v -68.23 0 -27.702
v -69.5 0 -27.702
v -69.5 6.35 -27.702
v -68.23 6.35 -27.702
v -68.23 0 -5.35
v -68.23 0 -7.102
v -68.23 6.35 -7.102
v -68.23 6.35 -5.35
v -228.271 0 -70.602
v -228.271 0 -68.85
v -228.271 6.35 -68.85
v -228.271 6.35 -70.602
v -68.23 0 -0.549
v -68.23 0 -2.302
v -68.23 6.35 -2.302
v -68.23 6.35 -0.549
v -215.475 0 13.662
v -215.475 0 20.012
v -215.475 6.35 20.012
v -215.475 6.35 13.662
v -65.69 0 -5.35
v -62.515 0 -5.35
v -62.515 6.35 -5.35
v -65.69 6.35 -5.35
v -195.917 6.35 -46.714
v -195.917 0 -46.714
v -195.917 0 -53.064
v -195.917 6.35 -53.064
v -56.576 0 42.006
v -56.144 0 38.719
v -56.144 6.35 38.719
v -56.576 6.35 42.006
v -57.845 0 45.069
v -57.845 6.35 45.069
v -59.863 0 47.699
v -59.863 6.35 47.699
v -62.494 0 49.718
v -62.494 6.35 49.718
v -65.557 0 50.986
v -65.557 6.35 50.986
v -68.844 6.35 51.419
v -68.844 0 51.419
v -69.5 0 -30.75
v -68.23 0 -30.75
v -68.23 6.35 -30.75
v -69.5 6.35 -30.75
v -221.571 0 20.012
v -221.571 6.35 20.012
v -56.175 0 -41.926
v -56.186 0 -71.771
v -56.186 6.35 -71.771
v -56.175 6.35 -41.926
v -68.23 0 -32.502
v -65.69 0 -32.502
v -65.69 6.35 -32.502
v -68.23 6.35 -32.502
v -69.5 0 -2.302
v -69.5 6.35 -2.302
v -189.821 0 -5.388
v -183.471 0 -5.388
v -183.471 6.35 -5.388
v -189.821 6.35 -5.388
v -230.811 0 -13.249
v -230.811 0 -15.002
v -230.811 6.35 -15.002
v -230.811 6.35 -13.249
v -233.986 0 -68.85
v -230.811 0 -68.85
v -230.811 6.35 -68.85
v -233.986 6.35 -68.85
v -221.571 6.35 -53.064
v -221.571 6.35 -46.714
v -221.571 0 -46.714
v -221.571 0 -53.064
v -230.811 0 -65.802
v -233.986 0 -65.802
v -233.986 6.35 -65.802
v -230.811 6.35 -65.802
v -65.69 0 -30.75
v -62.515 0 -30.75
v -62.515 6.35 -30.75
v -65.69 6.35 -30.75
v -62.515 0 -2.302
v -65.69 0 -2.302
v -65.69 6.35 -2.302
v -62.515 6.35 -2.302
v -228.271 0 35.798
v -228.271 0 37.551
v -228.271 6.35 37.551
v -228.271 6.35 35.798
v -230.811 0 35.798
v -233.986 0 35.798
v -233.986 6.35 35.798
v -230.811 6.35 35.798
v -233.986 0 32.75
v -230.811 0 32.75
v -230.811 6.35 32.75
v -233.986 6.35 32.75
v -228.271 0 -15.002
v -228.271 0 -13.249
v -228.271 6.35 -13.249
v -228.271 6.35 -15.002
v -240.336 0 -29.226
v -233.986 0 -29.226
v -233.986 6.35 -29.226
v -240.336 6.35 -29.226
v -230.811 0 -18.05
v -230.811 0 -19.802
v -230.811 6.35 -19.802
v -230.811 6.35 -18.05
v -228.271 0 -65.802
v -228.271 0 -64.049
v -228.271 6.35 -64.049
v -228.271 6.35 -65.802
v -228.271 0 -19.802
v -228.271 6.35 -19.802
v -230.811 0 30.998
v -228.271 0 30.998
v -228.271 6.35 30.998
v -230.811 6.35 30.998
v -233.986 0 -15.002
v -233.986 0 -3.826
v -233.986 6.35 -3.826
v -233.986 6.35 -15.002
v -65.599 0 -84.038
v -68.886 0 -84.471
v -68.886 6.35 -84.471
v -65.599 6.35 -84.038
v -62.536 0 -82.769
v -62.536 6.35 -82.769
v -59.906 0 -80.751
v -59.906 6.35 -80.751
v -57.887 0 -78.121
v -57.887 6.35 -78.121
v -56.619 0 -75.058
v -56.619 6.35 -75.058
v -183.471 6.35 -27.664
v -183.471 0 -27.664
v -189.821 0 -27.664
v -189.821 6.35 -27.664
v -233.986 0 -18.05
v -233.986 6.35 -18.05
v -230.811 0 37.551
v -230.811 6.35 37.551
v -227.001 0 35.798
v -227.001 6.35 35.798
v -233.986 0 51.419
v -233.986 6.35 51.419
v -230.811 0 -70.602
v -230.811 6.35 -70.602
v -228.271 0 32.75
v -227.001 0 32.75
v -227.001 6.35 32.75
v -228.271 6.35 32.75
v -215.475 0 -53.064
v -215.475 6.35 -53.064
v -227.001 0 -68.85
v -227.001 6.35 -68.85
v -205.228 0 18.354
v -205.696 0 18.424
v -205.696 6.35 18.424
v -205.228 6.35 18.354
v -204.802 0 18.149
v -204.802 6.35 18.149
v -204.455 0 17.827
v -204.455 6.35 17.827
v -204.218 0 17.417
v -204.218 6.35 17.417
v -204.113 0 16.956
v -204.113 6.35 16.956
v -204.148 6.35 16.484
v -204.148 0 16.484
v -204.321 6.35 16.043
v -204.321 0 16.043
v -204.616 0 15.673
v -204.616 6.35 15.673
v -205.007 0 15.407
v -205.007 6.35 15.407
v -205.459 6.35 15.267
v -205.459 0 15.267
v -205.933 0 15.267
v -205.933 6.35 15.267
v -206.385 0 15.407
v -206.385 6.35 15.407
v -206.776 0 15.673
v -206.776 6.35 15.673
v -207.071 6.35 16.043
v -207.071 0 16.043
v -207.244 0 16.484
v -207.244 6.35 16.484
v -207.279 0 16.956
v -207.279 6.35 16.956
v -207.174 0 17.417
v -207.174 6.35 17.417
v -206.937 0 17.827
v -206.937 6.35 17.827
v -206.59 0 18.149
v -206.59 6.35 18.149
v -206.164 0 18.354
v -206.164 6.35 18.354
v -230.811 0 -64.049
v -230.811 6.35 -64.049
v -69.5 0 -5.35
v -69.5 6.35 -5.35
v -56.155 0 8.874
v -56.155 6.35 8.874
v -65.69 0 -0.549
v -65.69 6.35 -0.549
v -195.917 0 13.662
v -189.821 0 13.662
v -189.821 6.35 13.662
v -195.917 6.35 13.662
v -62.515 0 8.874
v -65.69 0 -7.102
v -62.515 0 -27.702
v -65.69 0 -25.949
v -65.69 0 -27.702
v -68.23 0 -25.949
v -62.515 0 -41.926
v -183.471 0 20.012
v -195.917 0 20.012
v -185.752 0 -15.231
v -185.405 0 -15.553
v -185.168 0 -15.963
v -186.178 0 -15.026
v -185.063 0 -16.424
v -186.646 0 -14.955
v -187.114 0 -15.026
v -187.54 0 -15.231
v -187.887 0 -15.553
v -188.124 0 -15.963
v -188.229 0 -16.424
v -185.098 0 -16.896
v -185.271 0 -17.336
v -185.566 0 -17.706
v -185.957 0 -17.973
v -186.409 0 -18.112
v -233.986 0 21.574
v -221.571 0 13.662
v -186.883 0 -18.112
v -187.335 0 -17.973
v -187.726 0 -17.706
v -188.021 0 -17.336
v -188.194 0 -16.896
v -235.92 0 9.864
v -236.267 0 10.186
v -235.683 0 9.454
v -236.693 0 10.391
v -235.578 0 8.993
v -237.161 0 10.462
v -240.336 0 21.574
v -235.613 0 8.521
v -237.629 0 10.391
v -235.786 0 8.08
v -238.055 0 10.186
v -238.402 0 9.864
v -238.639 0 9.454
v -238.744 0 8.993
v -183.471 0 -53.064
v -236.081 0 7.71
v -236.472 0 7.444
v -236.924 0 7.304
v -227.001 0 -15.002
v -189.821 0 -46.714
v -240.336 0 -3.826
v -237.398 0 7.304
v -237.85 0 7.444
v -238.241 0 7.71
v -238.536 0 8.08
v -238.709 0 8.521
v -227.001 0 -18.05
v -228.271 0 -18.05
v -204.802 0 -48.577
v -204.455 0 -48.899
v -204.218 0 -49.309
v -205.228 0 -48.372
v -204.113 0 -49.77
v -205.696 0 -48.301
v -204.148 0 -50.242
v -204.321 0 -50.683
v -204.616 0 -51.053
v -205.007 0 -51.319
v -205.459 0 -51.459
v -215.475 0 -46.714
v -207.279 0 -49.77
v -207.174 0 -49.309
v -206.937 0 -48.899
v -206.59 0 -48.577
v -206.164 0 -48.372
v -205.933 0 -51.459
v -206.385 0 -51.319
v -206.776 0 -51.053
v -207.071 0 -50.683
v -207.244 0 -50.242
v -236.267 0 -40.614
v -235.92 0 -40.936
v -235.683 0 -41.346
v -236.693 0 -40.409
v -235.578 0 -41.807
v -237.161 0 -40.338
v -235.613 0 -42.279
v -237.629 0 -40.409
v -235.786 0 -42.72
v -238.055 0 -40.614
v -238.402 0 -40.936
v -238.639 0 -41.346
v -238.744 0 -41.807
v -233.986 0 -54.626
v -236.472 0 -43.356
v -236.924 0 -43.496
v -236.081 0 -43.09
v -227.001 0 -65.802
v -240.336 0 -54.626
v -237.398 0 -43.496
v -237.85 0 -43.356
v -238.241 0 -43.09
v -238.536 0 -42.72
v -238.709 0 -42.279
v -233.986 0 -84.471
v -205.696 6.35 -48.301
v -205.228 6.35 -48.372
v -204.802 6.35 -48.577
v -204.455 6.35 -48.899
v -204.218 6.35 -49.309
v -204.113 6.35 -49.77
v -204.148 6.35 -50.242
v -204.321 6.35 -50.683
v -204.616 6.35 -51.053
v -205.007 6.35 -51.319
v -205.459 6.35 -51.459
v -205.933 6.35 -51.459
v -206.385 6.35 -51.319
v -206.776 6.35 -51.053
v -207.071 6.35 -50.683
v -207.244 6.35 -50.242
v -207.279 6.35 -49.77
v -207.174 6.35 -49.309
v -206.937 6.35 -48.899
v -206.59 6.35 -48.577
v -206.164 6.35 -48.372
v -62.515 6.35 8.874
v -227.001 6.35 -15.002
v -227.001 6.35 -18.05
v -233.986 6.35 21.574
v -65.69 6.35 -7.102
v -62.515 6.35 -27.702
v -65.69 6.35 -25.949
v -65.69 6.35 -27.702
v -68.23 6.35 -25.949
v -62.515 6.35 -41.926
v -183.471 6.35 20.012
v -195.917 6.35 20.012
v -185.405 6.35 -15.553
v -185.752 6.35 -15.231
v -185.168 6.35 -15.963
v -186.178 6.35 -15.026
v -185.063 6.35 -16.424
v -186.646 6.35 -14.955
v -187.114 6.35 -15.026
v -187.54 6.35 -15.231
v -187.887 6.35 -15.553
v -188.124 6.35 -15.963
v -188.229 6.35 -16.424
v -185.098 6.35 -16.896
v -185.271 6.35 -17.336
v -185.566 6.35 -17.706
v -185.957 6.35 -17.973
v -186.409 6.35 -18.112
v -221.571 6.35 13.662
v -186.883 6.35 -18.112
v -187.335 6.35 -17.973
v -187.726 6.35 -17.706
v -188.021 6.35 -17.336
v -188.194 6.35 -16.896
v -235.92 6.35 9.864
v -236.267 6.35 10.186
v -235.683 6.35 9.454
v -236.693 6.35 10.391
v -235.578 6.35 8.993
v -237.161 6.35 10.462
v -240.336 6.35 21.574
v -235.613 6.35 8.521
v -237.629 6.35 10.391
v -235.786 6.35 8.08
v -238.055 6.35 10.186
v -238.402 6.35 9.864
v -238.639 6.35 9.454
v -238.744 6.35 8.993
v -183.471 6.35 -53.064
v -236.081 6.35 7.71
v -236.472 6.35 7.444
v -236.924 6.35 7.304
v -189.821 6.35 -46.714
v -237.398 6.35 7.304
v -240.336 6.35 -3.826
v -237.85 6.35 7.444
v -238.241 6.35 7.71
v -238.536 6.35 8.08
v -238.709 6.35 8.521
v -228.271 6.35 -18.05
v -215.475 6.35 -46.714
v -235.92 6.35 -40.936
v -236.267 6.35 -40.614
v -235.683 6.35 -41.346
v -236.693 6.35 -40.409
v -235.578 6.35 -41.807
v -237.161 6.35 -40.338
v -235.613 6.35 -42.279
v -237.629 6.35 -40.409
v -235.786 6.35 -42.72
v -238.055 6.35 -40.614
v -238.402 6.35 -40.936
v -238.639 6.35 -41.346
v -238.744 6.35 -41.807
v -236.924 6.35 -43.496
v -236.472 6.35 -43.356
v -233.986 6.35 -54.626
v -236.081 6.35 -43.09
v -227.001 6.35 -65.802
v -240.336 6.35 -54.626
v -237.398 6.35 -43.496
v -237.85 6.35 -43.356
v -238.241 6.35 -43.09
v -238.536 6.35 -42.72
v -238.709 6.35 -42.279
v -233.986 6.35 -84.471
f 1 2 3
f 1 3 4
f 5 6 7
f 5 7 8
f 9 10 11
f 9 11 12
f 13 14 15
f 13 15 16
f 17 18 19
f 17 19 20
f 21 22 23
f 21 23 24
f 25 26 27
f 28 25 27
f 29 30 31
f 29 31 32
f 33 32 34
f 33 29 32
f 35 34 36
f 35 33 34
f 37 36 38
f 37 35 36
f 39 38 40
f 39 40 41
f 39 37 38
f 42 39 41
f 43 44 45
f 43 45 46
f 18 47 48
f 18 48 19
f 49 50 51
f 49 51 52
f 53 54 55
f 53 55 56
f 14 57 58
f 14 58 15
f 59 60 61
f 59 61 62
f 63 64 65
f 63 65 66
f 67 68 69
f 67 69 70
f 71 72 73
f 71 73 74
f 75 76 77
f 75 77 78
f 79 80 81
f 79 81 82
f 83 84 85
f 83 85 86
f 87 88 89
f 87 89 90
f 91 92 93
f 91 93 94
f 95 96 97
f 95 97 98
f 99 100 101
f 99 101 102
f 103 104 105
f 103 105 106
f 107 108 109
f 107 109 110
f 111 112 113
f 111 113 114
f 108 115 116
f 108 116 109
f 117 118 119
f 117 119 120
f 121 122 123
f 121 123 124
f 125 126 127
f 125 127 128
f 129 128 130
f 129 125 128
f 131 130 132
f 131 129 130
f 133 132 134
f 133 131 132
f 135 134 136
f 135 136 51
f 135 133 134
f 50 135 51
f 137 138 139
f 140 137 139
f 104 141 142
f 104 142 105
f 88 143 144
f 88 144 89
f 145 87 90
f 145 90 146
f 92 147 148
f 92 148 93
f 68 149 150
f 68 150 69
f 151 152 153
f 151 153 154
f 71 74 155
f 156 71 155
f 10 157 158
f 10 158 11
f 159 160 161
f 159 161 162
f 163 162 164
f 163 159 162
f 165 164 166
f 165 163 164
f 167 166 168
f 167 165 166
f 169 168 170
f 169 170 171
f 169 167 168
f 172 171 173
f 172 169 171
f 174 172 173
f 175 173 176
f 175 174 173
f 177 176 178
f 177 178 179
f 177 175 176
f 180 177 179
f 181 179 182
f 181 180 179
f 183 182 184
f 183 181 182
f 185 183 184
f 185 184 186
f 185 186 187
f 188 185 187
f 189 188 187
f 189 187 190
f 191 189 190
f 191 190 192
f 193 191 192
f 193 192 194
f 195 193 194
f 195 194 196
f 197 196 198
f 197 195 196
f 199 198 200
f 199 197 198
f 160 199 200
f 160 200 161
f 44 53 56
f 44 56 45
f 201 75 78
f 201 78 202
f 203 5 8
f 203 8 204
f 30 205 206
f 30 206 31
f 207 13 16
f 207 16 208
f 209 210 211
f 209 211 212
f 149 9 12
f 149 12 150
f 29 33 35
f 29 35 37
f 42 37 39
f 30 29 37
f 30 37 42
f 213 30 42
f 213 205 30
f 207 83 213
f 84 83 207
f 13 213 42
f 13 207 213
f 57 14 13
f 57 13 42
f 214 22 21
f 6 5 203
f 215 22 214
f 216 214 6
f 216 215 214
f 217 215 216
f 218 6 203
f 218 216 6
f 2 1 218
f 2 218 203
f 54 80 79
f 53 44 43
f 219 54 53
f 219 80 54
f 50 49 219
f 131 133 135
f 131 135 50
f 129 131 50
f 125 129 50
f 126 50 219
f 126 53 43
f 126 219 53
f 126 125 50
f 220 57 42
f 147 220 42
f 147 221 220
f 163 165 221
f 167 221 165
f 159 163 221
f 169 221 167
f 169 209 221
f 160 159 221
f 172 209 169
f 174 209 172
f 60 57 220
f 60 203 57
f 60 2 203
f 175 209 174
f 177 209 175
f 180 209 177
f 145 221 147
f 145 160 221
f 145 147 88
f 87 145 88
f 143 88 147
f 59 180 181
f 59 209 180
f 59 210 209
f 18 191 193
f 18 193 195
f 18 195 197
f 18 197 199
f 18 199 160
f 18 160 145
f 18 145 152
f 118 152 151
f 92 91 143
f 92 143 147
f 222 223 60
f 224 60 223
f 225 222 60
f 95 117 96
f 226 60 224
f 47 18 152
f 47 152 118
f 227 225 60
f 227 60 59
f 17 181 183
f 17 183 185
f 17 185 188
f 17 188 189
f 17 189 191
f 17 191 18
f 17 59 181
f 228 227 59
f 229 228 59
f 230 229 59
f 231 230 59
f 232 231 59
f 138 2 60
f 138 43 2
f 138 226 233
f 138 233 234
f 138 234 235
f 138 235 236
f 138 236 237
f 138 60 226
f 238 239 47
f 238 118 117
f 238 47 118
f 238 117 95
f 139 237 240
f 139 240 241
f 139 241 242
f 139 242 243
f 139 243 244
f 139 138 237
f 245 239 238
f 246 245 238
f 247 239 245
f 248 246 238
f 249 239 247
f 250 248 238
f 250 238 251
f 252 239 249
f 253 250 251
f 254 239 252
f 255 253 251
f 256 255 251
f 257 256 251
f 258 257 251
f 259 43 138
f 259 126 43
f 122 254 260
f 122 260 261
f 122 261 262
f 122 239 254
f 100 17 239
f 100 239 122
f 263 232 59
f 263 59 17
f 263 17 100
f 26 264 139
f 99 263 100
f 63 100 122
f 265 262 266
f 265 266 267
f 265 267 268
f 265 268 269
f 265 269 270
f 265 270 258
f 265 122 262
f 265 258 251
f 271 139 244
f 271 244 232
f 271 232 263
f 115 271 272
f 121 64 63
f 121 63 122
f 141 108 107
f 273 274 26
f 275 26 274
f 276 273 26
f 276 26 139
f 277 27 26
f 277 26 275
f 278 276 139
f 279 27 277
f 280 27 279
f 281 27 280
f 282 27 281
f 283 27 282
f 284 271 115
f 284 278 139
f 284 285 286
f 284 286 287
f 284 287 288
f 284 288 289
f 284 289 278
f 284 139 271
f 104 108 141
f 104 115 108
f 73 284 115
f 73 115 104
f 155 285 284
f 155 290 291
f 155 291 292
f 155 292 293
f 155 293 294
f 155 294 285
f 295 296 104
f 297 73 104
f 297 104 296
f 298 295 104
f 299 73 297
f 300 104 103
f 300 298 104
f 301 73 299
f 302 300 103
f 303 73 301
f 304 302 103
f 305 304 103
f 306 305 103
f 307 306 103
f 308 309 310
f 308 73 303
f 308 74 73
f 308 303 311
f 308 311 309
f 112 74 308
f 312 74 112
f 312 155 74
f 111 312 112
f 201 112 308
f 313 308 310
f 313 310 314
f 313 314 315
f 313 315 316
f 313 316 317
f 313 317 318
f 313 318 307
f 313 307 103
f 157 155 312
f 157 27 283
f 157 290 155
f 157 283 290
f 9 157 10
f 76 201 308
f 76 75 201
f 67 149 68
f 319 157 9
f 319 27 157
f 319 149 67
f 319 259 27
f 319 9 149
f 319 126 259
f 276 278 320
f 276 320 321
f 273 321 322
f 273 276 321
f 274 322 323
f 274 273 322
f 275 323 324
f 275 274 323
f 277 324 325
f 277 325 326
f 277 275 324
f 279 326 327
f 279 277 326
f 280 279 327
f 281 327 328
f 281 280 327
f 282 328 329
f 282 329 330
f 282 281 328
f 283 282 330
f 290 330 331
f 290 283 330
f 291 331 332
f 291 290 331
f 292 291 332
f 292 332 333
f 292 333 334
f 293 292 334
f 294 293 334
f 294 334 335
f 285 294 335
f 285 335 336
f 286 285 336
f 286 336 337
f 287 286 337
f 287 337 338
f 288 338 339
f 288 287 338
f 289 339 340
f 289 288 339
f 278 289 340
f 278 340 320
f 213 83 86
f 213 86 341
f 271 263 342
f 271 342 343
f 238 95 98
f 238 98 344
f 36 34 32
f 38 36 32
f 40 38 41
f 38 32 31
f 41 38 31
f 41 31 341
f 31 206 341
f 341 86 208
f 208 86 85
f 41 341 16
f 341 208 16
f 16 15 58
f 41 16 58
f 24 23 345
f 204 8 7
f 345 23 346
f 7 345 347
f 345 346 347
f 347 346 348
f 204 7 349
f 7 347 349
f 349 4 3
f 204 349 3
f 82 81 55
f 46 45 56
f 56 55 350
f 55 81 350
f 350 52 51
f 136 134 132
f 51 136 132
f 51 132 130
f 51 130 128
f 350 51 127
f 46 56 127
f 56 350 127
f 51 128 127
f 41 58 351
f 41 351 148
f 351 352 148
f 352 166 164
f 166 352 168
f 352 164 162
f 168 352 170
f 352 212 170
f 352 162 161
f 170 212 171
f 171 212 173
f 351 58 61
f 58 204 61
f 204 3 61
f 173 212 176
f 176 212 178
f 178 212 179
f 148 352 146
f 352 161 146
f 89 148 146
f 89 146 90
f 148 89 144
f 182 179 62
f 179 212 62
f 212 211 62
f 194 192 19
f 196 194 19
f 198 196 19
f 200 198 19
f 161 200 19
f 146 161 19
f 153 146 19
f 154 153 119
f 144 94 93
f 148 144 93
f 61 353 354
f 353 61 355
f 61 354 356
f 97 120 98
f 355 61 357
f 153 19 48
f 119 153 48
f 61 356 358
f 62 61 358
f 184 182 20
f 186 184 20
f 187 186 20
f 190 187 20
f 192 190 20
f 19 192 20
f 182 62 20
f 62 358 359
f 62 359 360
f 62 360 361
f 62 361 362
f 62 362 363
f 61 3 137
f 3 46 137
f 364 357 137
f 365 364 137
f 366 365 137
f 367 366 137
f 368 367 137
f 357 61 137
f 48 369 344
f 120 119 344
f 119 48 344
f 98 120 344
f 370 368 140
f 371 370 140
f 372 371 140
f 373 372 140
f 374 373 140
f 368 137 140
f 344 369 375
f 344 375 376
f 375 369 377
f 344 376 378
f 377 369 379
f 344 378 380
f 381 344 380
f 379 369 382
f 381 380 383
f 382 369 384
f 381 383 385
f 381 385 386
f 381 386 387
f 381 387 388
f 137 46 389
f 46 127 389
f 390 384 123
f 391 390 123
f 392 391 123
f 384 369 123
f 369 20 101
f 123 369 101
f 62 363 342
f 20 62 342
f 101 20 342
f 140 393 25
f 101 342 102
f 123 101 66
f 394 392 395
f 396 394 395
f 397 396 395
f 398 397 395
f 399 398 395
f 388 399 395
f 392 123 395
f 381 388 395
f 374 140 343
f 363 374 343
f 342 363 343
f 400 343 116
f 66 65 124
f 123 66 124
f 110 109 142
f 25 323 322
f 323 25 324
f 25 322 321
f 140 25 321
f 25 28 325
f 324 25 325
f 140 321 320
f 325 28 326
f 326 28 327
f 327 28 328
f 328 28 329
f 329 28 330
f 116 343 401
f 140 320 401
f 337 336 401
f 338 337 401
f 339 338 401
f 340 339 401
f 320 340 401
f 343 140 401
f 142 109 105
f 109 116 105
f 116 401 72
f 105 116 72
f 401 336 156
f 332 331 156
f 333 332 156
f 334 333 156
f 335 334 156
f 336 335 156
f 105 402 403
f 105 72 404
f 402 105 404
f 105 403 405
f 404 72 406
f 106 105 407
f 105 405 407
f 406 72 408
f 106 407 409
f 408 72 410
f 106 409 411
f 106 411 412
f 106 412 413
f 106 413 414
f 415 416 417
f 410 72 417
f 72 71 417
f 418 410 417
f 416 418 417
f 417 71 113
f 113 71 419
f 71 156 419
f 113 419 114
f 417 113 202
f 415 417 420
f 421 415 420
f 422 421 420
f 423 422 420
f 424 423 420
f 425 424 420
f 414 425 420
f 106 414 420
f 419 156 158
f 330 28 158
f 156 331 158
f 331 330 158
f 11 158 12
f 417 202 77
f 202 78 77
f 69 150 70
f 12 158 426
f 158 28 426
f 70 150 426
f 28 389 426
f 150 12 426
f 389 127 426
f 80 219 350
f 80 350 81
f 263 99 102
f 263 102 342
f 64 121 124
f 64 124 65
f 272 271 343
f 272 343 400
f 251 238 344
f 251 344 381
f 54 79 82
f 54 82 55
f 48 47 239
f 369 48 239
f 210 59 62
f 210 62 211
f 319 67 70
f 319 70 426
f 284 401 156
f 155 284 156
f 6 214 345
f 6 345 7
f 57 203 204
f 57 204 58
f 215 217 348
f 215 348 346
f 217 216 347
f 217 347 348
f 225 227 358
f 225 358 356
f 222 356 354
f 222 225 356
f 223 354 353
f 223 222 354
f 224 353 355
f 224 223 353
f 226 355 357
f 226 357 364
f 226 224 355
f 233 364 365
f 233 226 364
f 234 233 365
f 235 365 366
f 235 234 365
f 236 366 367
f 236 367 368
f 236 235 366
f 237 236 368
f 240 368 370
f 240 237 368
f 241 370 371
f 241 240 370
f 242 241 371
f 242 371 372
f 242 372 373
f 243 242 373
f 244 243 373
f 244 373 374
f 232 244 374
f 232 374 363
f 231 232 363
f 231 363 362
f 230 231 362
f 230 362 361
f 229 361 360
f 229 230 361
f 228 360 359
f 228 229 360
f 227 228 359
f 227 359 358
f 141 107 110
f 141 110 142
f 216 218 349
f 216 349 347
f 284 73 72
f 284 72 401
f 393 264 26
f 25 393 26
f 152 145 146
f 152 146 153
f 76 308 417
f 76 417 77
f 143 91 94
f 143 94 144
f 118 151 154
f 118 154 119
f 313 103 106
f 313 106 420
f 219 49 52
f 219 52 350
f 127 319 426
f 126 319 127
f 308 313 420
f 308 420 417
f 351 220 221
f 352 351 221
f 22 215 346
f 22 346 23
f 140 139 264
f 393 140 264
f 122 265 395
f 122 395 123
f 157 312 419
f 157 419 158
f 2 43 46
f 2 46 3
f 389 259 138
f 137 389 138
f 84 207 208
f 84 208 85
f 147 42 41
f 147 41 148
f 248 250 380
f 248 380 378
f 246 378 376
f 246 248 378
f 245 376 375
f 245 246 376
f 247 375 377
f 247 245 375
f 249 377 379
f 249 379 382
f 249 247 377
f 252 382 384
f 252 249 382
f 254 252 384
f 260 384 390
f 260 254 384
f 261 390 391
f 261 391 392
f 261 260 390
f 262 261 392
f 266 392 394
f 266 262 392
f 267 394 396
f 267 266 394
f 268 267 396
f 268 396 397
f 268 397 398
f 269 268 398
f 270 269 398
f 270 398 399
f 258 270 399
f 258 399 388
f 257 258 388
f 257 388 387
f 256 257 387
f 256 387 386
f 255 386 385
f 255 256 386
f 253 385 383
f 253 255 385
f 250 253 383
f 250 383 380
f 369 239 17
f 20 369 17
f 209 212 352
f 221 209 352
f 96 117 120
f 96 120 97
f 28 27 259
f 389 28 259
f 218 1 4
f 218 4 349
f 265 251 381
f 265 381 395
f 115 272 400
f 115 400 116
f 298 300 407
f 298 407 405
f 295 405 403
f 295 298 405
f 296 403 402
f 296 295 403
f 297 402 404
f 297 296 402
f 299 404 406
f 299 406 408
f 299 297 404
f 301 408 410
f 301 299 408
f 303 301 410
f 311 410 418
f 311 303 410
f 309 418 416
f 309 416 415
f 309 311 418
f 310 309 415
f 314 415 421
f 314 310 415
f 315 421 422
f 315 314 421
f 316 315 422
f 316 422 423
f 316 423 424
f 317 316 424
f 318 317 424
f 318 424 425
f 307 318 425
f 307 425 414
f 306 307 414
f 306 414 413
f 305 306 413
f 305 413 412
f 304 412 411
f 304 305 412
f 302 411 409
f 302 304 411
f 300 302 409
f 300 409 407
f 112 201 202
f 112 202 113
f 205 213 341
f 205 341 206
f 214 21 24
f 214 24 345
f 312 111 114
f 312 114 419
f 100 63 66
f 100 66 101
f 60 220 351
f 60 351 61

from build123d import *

# Parameters (mm, degrees)
SKETCH1_R           = 1.5875
SKETCH1_W           = 6.096
SKETCH1_H           = 6.35
BOSS_EXTRUDE1_DEPTH = 6.35


with BuildPart() as part:
    # Sketch1 → Boss-Extrude1 (new body)
    with BuildSketch(Plane(origin=(0, 0, 0), x_dir=(1, 0, 0), z_dir=(0, 1, 0))):
        with BuildLine():
            Line((-233.985969077, 84.470905347), (-68.885969077, 84.470905347))
            ThreePointArc((-68.885969077, 84.470905347), (-59.905712956, 80.751161468), (-56.185969077, 71.770905347))
            Line((-56.185969077, 71.770905347), (-56.174553175, 41.925905347))
            Line((-56.174553175, 41.925905347), (-62.514837513, 41.925905347))
            Line((-62.514837513, 41.925905347), (-62.514837513, 30.749799864))
            Line((-62.514837513, 30.749799864), (-65.689837513, 30.749799864))
            Line((-65.689837513, 30.749799864), (-65.689837513, 32.502399864))
            Line((-65.689837513, 32.502399864), (-68.229837513, 32.502399864))
            Line((-68.229837513, 32.502399864), (-68.229837513, 30.749799864))
            Line((-68.229837513, 30.749799864), (-69.499837513, 30.749799864))
            Line((-69.499837513, 30.749799864), (-69.499837513, 27.701940508))
            Line((-69.499837513, 27.701940508), (-68.229837513, 27.701940508))
            Line((-68.229837513, 27.701940508), (-68.229837513, 25.949340508))
            Line((-68.229837513, 25.949340508), (-65.689837513, 25.949340508))
            Line((-65.689837513, 25.949340508), (-65.689837513, 27.701940508))
            Line((-65.689837513, 27.701940508), (-62.514837513, 27.701940508))
            Line((-62.514837513, 27.701940508), (-62.514837513, 16.525905347))
            Line((-62.514837513, 16.525905347), (-62.514837513, 5.349799864))
            Line((-62.514837513, 5.349799864), (-65.689837513, 5.349799864))
            Line((-65.689837513, 5.349799864), (-65.689837513, 7.102399864))
            Line((-65.689837513, 7.102399864), (-68.229837513, 7.102399864))
            Line((-68.229837513, 7.102399864), (-68.229837513, 5.349799864))
            Line((-68.229837513, 5.349799864), (-69.499837513, 5.349799864))
            Line((-69.499837513, 5.349799864), (-69.499837513, 2.301940508))
            Line((-69.499837513, 2.301940508), (-68.229837513, 2.301940508))
            Line((-68.229837513, 2.301940508), (-68.229837513, 0.549340508))
            Line((-68.229837513, 0.549340508), (-65.689837513, 0.549340508))
            Line((-65.689837513, 0.549340508), (-65.689837513, 2.301940508))
            Line((-65.689837513, 2.301940508), (-62.514837513, 2.301940508))
            Line((-62.514837513, 2.301940508), (-62.514837513, -8.874094653))
            Line((-62.514837513, -8.874094653), (-56.155121852, -8.874094653))
            Line((-56.155121852, -8.874094653), (-56.14370595, -38.719094653))
            ThreePointArc((-56.14370595, -38.719094653), (-59.863449829, -47.699350774), (-68.84370595, -51.419094653))
            Line((-68.84370595, -51.419094653), (-233.985969077, -51.419094653))
            Line((-233.985969077, -51.419094653), (-233.985969077, -45.069094653))
            Line((-233.985969077, -45.069094653), (-233.985969077, -35.798024331))
            Line((-233.985969077, -35.798024331), (-230.810969077, -35.798024331))
            Line((-230.810969077, -35.798024331), (-230.810969077, -37.550624331))
            Line((-230.810969077, -37.550624331), (-228.270969077, -37.550624331))
            Line((-228.270969077, -37.550624331), (-228.270969077, -35.798024331))
            Line((-228.270969077, -35.798024331), (-227.000969077, -35.798024331))
            Line((-227.000969077, -35.798024331), (-227.000969077, -32.750164975))
            Line((-227.000969077, -32.750164975), (-228.270969077, -32.750164975))
            Line((-228.270969077, -32.750164975), (-228.270969077, -30.997564975))
            Line((-228.270969077, -30.997564975), (-230.810969077, -30.997564975))
            Line((-230.810969077, -30.997564975), (-230.810969077, -32.750164975))
            Line((-230.810969077, -32.750164975), (-233.985969077, -32.750164975))
            Line((-233.985969077, -32.750164975), (-233.985969077, -21.574094653))
            Line((-233.985969077, -21.574094653), (-240.335969077, -21.574094653))
            Line((-240.335969077, -21.574094653), (-240.335969077, 3.825905347))
            Line((-240.335969077, 3.825905347), (-233.985969077, 3.825905347))
            Line((-233.985969077, 3.825905347), (-233.985969077, 15.001975669))
            Line((-233.985969077, 15.001975669), (-230.810969077, 15.001975669))
            Line((-230.810969077, 15.001975669), (-230.810969077, 13.249375669))
            Line((-230.810969077, 13.249375669), (-228.270969077, 13.249375669))
            Line((-228.270969077, 13.249375669), (-228.270969077, 15.001975669))
            Line((-228.270969077, 15.001975669), (-227.000969077, 15.001975669))
            Line((-227.000969077, 15.001975669), (-227.000969077, 18.049835025))
            Line((-227.000969077, 18.049835025), (-228.270969077, 18.049835025))
            Line((-228.270969077, 18.049835025), (-228.270969077, 19.802435025))
            Line((-228.270969077, 19.802435025), (-230.810969077, 19.802435025))
            Line((-230.810969077, 19.802435025), (-230.810969077, 18.049835025))
            Line((-230.810969077, 18.049835025), (-233.985969077, 18.049835025))
            Line((-233.985969077, 18.049835025), (-233.985969077, 29.225905347))
            Line((-233.985969077, 29.225905347), (-240.335969077, 29.225905347))
            Line((-240.335969077, 29.225905347), (-240.335969077, 54.625905347))
            Line((-240.335969077, 54.625905347), (-233.985969077, 54.625905347))
            Line((-233.985969077, 54.625905347), (-233.985969077, 65.801975669))
            Line((-233.985969077, 65.801975669), (-230.810969077, 65.801975669))
            Line((-230.810969077, 65.801975669), (-230.810969077, 64.049375669))
            Line((-230.810969077, 64.049375669), (-228.270969077, 64.049375669))
            Line((-228.270969077, 64.049375669), (-228.270969077, 65.801975669))
            Line((-228.270969077, 65.801975669), (-227.000969077, 65.801975669))
            Line((-227.000969077, 65.801975669), (-227.000969077, 68.849835025))
            Line((-227.000969077, 68.849835025), (-228.270969077, 68.849835025))
            Line((-228.270969077, 68.849835025), (-228.270969077, 70.602435025))
            Line((-228.270969077, 70.602435025), (-230.810969077, 70.602435025))
            Line((-230.810969077, 70.602435025), (-230.810969077, 68.849835025))
            Line((-230.810969077, 68.849835025), (-233.985969077, 68.849835025))
            Line((-233.985969077, 68.849835025), (-233.985969077, 78.120905347))
            Line((-233.985969077, 78.120905347), (-233.985969077, 84.470905347))
        make_face()
        with Locations(Location((-237.160969077, 41.925905347, 0), (0, 0, 270))):
            Circle(SKETCH1_R, mode=Mode.SUBTRACT)
        with Locations(Location((-237.160969077, -8.874094653, 0), (0, 0, 270))):
            Circle(SKETCH1_R, mode=Mode.SUBTRACT)
        with Locations(Location((-186.646041016, 16.54252462, 0), (0, 0, 270))):
            Circle(SKETCH1_R, mode=Mode.SUBTRACT)
        with Locations(Location((-205.696041016, -16.836994653, 0), (0, 0, 270))):
            Circle(SKETCH1_R, mode=Mode.SUBTRACT)
        with Locations(Location((-205.696041016, 49.888805347, 0), (0, 0, 270))):
            Circle(SKETCH1_R, mode=Mode.SUBTRACT)
        Polygon((-189.821041016, -20.011994653), (-183.471041016, -20.011994653), (-183.471041016, 5.388005347), (-189.821041016, 5.388005347), (-189.821041016, -13.661994653), (-195.917041016, -13.661994653), (-195.917041016, -20.011994653), align=None, mode=Mode.SUBTRACT)
        Polygon((-189.821041016, 53.063805347), (-183.471041016, 53.063805347), (-183.471041016, 27.663805347), (-189.821041016, 27.663805347), (-189.821041016, 46.713805347), (-195.917041016, 46.713805347), (-195.917041016, 53.063805347), align=None, mode=Mode.SUBTRACT)
        with Locations((-218.523041016, -16.836994653)):
            Rectangle(SKETCH1_W, SKETCH1_H, mode=Mode.SUBTRACT)
        with Locations((-218.523041016, 49.888805347)):
            Rectangle(SKETCH1_W, SKETCH1_H, mode=Mode.SUBTRACT)
    extrude(amount=BOSS_EXTRUDE1_DEPTH)


solid = part.part
